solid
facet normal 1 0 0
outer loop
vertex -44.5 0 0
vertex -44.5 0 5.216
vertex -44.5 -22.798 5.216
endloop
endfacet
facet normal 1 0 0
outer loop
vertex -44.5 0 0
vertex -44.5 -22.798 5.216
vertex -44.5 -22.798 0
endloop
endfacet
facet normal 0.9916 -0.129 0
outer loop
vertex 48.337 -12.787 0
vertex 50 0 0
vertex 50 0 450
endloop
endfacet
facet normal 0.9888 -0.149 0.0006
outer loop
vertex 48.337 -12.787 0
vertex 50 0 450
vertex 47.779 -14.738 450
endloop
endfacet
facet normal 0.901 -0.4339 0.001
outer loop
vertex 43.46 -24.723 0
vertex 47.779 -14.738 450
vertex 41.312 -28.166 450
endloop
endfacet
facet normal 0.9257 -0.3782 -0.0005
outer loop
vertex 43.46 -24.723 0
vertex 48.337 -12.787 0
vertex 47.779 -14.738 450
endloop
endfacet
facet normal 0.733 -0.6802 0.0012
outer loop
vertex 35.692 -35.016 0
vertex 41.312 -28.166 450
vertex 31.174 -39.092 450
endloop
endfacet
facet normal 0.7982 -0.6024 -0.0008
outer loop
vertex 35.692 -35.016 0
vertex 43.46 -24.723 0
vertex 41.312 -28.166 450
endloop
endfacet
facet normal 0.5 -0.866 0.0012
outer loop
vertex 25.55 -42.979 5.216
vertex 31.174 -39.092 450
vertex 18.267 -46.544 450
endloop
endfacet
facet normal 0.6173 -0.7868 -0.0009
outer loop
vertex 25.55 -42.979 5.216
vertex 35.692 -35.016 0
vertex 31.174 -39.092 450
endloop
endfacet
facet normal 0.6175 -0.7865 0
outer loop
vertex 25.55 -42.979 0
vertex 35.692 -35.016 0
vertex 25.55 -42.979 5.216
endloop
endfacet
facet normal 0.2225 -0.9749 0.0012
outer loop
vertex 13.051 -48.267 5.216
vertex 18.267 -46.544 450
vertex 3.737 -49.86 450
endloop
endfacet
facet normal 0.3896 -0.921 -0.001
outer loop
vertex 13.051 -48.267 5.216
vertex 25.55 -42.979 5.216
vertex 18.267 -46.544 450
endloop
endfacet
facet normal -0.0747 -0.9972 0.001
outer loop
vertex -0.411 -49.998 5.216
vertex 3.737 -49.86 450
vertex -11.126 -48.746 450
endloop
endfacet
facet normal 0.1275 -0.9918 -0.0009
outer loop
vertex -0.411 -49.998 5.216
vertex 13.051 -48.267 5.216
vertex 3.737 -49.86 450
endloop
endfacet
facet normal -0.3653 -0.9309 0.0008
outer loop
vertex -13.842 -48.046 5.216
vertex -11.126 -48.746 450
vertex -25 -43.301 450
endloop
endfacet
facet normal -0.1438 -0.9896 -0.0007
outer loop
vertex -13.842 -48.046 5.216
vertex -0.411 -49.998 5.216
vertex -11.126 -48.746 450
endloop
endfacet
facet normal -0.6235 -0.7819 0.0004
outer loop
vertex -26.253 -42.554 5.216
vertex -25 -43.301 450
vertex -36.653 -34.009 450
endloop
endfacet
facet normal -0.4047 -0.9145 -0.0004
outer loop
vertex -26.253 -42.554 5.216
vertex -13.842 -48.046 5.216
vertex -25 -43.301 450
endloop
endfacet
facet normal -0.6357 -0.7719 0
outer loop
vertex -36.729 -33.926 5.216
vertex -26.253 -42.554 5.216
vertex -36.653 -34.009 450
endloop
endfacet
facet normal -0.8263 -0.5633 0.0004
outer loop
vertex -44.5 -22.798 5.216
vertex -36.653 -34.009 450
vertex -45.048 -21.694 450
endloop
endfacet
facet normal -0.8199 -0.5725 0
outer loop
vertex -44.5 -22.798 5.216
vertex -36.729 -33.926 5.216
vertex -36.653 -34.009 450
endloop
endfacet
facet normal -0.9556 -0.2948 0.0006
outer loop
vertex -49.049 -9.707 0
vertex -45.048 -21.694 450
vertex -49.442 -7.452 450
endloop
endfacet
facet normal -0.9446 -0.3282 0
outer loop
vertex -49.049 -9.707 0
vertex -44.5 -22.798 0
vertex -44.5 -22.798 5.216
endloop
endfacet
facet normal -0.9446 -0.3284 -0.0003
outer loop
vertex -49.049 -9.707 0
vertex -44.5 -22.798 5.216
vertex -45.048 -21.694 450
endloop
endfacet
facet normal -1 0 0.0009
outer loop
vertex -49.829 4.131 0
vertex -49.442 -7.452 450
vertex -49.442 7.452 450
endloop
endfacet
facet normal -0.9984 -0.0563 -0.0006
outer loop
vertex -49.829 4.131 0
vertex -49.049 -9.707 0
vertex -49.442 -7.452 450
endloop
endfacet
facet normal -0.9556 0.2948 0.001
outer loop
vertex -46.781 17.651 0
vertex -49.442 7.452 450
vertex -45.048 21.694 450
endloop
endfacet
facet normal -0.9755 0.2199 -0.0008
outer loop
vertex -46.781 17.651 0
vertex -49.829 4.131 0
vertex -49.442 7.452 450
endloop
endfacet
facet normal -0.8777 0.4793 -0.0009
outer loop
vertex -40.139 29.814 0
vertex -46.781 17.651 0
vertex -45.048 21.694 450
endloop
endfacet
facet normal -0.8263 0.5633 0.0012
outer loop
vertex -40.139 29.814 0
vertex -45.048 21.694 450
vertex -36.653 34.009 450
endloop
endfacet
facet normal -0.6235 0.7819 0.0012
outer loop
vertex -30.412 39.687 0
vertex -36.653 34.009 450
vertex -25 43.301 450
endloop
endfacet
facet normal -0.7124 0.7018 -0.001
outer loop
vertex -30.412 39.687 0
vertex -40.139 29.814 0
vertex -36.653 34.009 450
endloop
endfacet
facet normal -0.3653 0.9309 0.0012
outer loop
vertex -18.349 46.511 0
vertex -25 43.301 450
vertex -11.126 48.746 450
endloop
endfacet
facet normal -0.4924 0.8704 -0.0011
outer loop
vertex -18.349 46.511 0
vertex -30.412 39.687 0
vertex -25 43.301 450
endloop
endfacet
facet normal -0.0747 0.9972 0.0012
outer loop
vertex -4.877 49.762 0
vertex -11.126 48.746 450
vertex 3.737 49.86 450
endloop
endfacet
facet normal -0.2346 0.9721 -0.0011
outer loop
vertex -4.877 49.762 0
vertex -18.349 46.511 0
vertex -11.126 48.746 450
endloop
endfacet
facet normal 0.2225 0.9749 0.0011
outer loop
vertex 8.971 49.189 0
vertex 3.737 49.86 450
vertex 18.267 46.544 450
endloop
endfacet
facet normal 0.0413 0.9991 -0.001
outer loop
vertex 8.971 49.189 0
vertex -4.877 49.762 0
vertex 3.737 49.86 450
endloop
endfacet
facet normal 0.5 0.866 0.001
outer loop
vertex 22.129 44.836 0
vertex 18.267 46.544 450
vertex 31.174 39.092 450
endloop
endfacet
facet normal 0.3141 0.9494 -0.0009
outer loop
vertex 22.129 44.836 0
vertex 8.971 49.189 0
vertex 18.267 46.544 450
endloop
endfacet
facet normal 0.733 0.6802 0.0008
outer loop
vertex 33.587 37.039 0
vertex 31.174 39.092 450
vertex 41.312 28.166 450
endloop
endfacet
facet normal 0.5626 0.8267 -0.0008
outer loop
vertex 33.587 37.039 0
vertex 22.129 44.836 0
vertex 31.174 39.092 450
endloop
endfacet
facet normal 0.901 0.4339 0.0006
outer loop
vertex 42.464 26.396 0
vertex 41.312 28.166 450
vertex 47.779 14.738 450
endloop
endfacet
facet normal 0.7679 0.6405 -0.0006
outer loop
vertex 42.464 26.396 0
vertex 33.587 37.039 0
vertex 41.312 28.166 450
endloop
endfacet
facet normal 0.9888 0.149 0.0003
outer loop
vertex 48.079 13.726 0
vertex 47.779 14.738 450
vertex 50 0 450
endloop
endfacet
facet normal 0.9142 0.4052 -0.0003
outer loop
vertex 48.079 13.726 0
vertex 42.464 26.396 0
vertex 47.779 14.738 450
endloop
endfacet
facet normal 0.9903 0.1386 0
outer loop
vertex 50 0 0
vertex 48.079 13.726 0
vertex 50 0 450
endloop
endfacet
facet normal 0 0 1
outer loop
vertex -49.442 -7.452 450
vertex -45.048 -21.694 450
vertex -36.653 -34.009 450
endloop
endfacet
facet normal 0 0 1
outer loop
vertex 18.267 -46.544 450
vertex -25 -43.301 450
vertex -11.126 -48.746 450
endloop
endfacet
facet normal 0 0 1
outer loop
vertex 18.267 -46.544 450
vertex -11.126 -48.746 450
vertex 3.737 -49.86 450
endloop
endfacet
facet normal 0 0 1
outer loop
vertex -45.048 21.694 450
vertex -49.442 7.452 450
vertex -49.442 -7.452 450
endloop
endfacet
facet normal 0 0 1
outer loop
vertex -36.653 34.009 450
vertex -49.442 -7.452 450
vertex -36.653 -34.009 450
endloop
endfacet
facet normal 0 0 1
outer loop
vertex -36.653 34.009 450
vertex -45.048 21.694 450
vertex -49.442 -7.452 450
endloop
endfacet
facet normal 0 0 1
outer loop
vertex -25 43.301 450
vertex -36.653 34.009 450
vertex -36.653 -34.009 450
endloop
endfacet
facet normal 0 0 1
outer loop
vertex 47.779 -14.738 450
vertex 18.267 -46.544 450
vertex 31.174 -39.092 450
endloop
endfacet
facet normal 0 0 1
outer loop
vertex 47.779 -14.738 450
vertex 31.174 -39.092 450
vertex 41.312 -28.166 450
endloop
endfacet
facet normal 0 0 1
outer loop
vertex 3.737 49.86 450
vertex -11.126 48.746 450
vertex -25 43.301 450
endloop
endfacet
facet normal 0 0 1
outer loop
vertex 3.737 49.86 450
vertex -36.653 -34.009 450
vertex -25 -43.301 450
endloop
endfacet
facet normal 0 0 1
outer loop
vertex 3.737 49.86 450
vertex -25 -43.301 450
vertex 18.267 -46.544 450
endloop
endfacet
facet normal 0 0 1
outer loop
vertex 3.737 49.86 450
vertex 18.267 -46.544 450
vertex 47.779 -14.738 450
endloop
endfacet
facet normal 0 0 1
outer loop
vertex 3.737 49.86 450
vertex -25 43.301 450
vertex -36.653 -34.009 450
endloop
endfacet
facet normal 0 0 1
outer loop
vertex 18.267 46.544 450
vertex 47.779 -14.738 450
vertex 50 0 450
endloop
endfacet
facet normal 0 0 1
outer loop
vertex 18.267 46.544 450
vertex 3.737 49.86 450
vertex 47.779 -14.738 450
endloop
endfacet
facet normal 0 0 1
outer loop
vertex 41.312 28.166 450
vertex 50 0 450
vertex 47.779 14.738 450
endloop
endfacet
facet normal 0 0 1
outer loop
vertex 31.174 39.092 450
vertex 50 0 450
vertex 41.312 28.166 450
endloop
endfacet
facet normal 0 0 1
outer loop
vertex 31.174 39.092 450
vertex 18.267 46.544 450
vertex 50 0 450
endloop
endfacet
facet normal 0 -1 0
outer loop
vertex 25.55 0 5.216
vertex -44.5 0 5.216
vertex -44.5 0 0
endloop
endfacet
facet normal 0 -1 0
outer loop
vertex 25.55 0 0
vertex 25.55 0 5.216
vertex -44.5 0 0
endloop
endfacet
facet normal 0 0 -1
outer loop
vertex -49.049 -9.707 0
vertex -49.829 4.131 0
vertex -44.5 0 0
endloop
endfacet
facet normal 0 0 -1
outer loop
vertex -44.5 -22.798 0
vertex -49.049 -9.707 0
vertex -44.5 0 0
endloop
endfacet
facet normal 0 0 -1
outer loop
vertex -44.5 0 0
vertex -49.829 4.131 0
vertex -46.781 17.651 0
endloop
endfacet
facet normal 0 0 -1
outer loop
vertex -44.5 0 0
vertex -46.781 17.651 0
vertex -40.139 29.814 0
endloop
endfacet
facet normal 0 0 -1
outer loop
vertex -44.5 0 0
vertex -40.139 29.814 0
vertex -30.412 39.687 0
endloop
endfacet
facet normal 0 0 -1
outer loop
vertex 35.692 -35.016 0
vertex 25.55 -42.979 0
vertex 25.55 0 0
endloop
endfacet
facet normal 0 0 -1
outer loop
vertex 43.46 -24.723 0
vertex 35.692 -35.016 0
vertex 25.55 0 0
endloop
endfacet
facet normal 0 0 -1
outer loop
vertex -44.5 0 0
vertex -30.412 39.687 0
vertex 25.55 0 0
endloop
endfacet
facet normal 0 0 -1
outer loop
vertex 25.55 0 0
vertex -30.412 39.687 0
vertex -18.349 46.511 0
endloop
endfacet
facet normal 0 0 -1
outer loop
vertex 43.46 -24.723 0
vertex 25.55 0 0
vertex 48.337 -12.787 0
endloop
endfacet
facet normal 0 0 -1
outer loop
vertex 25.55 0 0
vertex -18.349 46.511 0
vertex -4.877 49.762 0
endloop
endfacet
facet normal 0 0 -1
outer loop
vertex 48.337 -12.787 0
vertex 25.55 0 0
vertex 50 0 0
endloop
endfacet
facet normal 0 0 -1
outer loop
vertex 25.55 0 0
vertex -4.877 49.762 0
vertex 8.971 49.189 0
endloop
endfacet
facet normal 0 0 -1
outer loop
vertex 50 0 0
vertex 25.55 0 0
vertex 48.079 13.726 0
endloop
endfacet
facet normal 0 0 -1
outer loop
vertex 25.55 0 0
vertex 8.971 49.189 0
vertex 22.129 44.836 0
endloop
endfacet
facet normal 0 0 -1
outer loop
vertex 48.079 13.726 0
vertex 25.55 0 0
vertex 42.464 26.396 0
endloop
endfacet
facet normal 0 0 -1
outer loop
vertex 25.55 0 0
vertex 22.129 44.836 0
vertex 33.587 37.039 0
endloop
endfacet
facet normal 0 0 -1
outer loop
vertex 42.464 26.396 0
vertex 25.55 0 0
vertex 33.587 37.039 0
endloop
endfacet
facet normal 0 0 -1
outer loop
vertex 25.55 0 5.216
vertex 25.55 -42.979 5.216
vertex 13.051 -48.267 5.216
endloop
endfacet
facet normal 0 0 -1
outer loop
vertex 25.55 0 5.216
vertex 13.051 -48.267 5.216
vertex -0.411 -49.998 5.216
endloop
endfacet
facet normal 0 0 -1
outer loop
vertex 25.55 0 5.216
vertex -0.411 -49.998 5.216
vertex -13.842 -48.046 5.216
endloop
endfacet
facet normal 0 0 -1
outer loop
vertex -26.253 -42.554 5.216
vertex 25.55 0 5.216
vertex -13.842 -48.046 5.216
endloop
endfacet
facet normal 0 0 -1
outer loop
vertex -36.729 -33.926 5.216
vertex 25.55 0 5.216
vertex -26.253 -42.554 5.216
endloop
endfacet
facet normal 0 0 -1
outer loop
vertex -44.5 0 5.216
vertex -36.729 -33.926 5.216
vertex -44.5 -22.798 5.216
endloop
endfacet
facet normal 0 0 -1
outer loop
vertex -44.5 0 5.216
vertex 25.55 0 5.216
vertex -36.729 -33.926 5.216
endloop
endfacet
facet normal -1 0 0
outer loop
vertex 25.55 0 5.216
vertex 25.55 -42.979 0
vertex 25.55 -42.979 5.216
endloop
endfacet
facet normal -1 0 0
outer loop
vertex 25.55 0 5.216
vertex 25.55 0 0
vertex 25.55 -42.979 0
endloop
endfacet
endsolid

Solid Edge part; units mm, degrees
sketch "Sketch1" plane through (0, 0, 0) normal (0, 0, 1) x (1, 0, 0)
  circle A0 centre (0, 0) radius 50
extrude "Protrusion1" add sketch "Sketch1" along normal blind 450
sketch "Sketch2" plane through (0, 0, 0) normal (0, -1, 0) x (1, 0, 0)
  line L0 (25.5502, -35.238) -> (25.5502, 5.2165)
  line L1 (25.5502, 5.2165) -> (-44.4999, 5.2165)
  line L2 (-44.4999, 5.2165) -> (-44.4999, -35.238)
  line L3 (-44.4999, -35.238) -> (25.5502, -35.238)
extrude "Cutout1" cut sketch "Sketch2" along normal up to next
